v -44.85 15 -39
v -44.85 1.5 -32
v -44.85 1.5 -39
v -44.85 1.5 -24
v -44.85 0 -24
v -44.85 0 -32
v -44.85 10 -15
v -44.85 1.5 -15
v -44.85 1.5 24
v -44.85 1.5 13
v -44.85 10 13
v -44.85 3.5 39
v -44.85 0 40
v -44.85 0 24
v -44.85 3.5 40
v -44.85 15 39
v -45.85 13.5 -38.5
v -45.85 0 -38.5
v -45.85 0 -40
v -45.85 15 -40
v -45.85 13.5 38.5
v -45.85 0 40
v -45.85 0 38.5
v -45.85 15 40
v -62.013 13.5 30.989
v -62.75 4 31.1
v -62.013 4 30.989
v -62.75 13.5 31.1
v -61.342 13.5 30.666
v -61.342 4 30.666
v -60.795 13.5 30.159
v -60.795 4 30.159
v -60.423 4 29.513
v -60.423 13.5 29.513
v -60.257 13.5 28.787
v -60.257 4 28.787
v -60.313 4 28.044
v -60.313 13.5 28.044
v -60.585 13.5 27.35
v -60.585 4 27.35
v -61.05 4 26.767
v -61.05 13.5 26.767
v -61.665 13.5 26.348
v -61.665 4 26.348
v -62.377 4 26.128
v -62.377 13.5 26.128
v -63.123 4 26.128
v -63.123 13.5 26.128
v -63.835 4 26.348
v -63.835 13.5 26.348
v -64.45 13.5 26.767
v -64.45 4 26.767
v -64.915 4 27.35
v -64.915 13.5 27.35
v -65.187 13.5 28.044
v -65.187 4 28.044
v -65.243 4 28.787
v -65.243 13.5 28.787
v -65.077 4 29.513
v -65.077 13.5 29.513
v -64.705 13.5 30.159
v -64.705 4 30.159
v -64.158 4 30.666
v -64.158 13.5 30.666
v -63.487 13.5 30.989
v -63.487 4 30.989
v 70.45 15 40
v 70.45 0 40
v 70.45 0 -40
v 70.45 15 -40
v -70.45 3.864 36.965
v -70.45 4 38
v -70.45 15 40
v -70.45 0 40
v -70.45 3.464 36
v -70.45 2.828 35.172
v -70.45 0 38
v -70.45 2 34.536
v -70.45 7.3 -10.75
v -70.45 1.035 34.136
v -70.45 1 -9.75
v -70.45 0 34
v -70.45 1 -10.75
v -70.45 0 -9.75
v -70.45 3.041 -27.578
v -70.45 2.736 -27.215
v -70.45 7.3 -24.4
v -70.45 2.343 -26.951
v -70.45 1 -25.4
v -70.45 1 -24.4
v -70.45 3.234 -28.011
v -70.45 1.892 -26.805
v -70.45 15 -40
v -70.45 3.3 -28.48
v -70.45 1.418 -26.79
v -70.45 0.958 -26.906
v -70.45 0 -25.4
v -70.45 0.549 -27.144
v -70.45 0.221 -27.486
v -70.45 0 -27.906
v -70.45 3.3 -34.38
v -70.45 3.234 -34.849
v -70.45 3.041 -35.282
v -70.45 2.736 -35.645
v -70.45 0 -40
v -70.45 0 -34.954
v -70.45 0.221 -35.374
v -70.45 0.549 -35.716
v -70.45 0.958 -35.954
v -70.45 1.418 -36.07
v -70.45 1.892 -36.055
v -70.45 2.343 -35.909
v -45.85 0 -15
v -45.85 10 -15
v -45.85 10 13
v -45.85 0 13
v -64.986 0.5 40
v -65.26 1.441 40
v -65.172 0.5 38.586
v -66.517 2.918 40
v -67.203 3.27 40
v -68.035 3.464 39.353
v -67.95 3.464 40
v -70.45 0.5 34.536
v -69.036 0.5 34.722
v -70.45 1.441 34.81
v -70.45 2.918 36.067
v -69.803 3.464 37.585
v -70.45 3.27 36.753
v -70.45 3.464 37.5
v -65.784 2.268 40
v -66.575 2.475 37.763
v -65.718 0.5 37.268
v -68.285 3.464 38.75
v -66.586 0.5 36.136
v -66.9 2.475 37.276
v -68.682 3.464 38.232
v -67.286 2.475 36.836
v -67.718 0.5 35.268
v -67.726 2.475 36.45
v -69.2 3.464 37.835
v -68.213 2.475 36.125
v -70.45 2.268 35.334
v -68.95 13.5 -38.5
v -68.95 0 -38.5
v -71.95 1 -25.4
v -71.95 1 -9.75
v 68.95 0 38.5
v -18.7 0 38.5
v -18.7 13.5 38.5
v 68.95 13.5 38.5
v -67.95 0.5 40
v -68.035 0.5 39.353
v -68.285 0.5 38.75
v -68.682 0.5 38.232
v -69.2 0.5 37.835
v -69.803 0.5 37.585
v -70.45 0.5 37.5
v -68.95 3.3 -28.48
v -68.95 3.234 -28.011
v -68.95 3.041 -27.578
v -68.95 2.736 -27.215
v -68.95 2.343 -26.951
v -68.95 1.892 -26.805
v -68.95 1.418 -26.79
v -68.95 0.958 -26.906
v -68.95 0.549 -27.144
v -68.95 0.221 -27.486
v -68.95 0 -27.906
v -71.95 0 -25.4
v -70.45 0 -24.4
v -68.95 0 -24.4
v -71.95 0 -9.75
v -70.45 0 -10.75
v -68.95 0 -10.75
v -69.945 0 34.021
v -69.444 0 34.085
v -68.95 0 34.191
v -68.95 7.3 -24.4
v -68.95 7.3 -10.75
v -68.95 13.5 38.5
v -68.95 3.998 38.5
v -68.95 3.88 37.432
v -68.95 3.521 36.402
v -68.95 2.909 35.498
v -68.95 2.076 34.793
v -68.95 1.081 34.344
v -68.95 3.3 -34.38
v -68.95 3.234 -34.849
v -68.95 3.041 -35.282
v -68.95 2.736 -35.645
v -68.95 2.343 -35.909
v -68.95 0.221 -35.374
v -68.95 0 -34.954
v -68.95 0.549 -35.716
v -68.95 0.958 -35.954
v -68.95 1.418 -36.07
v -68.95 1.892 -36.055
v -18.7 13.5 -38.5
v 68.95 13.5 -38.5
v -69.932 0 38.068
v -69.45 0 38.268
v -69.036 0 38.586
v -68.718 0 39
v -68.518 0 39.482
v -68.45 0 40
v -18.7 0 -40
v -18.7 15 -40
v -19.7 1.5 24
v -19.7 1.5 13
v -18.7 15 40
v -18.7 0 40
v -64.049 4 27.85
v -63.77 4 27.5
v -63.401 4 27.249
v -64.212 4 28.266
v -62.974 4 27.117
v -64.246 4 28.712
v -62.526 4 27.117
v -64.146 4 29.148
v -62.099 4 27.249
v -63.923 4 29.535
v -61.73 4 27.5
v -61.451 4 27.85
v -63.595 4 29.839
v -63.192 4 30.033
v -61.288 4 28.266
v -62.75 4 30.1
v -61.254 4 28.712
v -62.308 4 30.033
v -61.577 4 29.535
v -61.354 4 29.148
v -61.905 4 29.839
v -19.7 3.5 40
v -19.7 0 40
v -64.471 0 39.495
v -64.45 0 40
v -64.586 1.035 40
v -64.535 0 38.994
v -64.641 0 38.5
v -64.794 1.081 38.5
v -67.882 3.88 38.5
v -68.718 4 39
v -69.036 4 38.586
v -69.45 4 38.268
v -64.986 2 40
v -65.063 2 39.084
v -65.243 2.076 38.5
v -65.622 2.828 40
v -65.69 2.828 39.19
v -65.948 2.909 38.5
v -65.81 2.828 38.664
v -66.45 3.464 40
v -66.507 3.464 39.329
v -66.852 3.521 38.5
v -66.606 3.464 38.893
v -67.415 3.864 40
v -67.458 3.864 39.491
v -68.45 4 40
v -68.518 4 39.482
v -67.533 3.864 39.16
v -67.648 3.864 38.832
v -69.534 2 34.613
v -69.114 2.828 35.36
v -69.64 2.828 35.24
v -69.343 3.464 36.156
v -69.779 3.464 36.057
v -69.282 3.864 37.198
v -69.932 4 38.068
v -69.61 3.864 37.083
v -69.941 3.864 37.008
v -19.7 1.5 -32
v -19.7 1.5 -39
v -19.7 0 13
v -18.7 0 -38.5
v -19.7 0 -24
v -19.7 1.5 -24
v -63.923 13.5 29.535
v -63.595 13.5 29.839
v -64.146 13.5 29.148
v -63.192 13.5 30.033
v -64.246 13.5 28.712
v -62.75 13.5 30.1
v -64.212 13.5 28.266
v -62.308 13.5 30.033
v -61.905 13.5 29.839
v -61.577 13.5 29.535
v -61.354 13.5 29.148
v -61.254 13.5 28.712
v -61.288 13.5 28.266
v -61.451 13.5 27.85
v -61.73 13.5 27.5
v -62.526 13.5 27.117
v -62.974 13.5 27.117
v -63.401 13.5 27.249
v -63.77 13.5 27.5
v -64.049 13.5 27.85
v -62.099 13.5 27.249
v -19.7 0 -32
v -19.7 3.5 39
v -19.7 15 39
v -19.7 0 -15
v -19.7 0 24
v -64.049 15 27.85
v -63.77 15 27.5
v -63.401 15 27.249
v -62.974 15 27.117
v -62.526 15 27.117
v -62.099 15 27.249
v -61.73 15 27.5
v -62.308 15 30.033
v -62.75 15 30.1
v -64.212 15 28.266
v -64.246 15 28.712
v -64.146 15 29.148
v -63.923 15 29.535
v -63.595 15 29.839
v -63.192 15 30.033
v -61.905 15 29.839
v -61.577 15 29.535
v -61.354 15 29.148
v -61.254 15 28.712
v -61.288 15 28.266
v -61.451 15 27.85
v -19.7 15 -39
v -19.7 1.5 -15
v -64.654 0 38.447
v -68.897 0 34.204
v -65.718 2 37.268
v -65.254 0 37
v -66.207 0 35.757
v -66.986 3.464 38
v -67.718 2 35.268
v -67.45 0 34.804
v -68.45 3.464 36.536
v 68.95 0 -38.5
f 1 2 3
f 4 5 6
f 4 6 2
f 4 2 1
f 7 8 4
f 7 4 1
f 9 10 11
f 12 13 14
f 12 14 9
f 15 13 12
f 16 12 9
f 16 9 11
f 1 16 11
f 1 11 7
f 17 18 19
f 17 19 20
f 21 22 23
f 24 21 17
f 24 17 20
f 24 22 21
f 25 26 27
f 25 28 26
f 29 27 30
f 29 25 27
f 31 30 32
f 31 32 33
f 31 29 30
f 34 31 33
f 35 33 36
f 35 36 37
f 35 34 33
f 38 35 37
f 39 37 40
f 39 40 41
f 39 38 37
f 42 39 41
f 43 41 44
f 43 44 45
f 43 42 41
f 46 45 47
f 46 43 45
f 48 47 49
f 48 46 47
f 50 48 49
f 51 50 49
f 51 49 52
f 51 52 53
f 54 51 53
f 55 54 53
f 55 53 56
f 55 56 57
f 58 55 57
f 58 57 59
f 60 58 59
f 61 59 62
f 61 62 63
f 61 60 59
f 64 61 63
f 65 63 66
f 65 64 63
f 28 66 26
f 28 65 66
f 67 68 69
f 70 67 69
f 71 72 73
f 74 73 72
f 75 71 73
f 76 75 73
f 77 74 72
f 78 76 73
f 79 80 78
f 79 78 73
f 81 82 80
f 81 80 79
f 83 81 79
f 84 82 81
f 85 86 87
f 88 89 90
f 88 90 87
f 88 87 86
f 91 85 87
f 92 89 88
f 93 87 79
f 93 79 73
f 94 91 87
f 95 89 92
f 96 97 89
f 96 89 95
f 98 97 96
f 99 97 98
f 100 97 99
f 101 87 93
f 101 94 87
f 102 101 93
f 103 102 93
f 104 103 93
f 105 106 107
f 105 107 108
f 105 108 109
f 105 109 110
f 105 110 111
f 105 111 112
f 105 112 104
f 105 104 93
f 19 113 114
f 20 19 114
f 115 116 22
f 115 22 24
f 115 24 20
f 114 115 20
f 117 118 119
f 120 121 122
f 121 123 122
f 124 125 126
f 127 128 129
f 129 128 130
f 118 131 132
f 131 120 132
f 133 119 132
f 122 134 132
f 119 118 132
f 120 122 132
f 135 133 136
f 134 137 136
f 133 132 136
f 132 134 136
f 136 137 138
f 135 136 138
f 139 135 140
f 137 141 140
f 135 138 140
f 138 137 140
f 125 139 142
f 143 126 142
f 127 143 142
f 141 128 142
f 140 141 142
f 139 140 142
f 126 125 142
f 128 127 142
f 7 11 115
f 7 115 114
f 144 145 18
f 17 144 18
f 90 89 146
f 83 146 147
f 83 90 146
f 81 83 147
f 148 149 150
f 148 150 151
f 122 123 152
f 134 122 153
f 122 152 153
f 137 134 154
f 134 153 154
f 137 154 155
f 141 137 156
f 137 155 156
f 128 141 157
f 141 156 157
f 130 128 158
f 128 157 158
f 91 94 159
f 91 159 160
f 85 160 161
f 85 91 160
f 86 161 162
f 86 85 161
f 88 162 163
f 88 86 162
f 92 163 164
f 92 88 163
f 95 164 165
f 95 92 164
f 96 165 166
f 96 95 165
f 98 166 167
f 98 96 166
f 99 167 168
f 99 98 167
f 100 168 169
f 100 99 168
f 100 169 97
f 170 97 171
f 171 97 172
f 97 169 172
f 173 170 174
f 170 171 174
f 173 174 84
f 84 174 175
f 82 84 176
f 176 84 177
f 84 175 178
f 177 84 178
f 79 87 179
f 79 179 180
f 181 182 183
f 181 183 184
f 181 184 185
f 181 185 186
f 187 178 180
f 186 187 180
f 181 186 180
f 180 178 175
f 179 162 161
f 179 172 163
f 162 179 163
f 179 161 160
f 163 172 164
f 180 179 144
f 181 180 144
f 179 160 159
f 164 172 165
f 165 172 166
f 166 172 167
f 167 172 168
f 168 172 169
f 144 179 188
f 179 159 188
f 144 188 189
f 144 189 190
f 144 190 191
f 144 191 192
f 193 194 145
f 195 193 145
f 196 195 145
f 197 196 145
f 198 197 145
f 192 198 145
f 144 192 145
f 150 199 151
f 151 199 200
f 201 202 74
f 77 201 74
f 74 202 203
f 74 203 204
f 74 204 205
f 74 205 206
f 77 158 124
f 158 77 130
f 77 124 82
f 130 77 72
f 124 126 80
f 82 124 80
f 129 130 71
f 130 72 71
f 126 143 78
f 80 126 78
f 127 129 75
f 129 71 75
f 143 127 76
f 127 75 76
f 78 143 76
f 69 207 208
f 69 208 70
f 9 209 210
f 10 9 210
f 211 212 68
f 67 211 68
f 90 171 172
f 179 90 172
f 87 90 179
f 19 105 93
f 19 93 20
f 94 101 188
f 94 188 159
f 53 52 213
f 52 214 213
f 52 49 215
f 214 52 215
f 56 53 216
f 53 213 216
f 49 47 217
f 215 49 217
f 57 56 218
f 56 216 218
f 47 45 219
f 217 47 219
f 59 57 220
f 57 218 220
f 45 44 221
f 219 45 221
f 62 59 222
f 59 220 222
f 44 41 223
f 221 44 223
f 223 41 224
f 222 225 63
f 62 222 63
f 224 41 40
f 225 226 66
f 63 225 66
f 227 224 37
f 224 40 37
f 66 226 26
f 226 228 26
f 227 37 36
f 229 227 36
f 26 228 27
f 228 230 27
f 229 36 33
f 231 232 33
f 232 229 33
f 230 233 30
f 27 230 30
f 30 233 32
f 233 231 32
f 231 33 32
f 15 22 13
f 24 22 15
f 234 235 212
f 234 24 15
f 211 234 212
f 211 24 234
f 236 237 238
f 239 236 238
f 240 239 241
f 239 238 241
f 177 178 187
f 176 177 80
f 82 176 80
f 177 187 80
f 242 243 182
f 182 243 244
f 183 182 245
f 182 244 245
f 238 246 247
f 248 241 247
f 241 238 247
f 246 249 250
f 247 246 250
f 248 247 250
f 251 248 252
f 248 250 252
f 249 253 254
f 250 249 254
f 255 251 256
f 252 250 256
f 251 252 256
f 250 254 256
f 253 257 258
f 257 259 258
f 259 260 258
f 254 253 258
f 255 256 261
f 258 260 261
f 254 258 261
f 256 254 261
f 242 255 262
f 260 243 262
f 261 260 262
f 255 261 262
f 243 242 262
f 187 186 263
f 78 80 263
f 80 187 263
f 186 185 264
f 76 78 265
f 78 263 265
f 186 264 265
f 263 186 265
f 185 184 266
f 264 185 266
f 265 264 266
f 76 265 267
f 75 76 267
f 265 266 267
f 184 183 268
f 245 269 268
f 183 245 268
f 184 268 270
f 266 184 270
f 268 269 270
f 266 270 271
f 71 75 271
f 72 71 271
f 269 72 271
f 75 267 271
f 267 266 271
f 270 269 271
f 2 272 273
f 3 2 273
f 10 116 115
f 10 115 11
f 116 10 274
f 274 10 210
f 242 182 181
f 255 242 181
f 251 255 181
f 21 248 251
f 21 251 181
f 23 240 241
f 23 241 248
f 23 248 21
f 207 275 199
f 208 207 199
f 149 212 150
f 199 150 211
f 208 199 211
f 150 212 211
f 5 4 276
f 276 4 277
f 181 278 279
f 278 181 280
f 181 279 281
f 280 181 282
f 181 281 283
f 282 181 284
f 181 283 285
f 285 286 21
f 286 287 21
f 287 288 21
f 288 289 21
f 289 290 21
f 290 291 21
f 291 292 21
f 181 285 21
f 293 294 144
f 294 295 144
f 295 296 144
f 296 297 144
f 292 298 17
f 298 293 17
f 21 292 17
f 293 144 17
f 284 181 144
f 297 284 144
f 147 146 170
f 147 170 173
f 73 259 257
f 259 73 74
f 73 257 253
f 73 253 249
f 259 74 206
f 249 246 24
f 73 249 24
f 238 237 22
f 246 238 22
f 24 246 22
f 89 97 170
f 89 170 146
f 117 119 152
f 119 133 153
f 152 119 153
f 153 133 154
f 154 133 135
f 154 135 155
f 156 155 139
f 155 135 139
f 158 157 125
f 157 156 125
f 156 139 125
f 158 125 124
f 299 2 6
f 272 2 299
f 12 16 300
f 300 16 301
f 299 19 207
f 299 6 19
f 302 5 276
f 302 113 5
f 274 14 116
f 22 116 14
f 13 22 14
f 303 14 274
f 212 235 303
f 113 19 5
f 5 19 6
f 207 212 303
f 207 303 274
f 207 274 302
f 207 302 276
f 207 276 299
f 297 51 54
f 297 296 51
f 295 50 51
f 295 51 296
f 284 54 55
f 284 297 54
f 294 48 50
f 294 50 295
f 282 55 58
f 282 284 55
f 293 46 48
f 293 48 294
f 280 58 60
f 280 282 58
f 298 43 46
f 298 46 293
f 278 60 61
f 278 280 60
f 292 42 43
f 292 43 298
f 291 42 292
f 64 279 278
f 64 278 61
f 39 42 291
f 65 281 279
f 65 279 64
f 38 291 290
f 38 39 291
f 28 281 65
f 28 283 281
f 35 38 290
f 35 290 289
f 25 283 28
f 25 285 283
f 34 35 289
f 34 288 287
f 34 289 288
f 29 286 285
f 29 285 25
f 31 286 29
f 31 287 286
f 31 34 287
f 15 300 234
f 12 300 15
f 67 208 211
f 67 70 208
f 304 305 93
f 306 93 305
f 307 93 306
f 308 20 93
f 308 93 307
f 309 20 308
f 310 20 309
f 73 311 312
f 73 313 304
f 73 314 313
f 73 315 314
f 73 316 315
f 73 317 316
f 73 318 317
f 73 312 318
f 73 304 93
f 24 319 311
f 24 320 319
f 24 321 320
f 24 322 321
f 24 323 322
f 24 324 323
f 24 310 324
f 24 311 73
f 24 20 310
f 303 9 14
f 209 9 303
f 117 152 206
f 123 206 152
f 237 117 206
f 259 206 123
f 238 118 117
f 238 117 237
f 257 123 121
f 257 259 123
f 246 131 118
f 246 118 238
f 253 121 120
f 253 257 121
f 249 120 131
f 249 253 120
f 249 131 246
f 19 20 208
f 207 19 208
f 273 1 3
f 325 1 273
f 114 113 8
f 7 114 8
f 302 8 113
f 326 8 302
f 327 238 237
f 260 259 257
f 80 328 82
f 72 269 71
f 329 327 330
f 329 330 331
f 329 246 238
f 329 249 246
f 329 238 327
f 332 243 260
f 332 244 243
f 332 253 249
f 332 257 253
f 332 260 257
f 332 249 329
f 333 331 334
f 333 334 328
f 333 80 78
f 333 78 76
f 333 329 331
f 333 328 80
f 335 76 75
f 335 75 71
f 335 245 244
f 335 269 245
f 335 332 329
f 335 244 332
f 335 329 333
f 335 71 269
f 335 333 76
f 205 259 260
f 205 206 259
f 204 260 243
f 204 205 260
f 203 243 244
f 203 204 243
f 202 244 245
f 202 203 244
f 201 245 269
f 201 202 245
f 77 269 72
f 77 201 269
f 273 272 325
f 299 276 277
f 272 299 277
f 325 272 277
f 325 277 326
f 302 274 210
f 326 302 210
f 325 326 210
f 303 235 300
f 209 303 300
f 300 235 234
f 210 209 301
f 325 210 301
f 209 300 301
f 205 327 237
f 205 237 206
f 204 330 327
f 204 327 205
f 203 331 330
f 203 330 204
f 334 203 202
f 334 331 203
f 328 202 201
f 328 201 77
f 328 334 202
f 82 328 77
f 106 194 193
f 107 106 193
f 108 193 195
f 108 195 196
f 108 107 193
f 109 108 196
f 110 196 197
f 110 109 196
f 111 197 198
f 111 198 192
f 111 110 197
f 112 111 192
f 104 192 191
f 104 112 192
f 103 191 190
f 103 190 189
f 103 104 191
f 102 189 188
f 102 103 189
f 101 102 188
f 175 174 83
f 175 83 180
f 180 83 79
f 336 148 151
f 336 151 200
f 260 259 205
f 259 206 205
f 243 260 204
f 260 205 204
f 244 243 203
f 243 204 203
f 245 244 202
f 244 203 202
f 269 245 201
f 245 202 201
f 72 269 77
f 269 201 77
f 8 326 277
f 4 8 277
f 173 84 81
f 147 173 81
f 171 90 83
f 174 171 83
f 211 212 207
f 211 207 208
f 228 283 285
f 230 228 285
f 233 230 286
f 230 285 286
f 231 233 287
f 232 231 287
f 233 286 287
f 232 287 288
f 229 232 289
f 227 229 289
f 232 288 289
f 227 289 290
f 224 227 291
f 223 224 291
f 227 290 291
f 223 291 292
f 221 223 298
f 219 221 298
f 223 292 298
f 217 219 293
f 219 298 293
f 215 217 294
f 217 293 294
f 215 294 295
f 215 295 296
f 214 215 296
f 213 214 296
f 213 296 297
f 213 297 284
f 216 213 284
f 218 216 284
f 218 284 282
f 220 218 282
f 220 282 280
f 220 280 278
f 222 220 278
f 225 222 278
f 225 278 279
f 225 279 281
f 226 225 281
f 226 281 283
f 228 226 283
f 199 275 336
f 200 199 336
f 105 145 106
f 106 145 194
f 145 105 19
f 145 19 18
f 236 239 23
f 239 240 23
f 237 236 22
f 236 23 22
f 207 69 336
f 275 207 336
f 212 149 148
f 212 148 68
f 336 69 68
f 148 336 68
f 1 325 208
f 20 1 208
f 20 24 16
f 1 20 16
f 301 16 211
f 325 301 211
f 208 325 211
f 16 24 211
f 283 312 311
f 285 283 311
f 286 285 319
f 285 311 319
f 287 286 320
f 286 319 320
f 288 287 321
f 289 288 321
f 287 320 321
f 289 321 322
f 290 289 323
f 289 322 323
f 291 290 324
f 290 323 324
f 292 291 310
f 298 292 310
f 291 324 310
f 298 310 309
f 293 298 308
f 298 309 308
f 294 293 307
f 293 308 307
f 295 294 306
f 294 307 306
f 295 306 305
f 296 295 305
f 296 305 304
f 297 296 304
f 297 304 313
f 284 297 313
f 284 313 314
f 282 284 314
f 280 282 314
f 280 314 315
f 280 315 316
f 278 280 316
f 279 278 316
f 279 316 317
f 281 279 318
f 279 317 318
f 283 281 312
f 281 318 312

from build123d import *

# Parameters (mm, degrees)
SKETCH1_W                  = 140.9
SKETCH1_H                  = 80
BOSS_EXTRUDE1_DEPTH        = 15
SHELL3_T                   = -1.5
CUT_EXTRUDE2_DEPTH         = 1.5
SKETCH6_W                  = 13.65
SKETCH6_H                  = 7.3
CUT_EXTRUDE3_DEPTH         = 1.5
SKETCH9_W                  = 15.65
SKETCH9_H                  = 1
BOSS_EXTRUDE2_DEPTH        = 1.5
SKETCH11_R                 = 1.5
BOSS_EXTRUDE10_DEPTH       = 11
SKETCH11_3_R               = 1.5
CUT_EXTRUDE10_DEPTH        = 1.5
SHELL9_T                   = 1
CUT_REVOLVE4_ANGLE         = 90
REVOLVE3_ANGLE             = 90
SHELL14_T                  = -0.5
SKETCH47_W                 = 27.15
SKETCH47_H                 = 15
CUT_EXTRUDE15_DEPTH        = 109.636101274
SKETCH47_2_W               = 27.15
SKETCH47_2_H               = 15
BOSS_EXTRUDE12_DEPTH       = 80
SHELL15_T                  = -1
SHELL15_THICKNESS_2_FACE_W = 78
SHELL15_THICKNESS_2_FACE_H = 25.15
SHELL15_THICKNESS_2_DEPTH  = 0.5
SKETCH52_W                 = 25.15
SKETCH52_H                 = 3.5
CUT_EXTRUDE21_DEPTH        = 1
SKETCH54_W                 = 28
SKETCH54_H                 = 10
CUT_EXTRUDE22_DEPTH        = 1
SKETCH55_W                 = 25.15
SKETCH55_H                 = 15
SKETCH55_H_2               = 28
SKETCH55_H_3               = 8
CUT_EXTRUDE23_DEPTH        = 1.5


with BuildPart() as part:
    # Sketch1 → Boss-Extrude1 (new body)
    with BuildSketch(Plane(origin=(0, 0, 0), x_dir=(1, 0, 0), z_dir=(0, 1, 0))):
        Rectangle(SKETCH1_W, SKETCH1_H)
    extrude(amount=BOSS_EXTRUDE1_DEPTH)

    # Shell3
    shell3_openings = [part.faces().sort_by_distance(p)[0] for p in [
        (0, 0, 0),
    ]]
    offset(amount=SHELL3_T, openings=shell3_openings, kind=Kind.INTERSECTION)

    # Sketch4 → Cut-Extrude2 (cut)
    with BuildSketch(Plane.ZY.offset(70.45)):
        with BuildLine():
            Line((-34.38, 3.3), (-28.48, 3.3))
            ThreePointArc((-28.48, 3.3), (-26.78, 1.6), (-28.48, -0.1))
            Line((-28.48, -0.1), (-34.38, -0.1))
            ThreePointArc((-34.38, -0.1), (-36.08, 1.6), (-34.38, 3.3))
        make_face()
    extrude(amount=-CUT_EXTRUDE2_DEPTH, mode=Mode.SUBTRACT)

    # Sketch6 → Cut-Extrude3 (cut)
    with BuildSketch(Plane.ZY.offset(70.45)):
        with Locations((-17.575, 3.65)):
            Rectangle(SKETCH6_W, SKETCH6_H)
    extrude(amount=-CUT_EXTRUDE3_DEPTH, mode=Mode.SUBTRACT)

    # Sketch9 → Boss-Extrude2 (add)
    with BuildSketch(Plane.ZY.offset(70.45)):
        with Locations((-17.575, 0.5)):
            Rectangle(SKETCH9_W, SKETCH9_H)
    extrude(amount=BOSS_EXTRUDE2_DEPTH)

    # Sketch11 → Boss-Extrude10 (add)
    with BuildSketch(Plane(origin=(0, 15, 0), x_dir=(1, 0, 0), z_dir=(0, 1, 0))):
        with Locations(Location((-62.75, -28.6, 0), (0, 0, 270))):
            Circle(SKETCH11_R)
    extrude(amount=-BOSS_EXTRUDE10_DEPTH)

    # Sketch11<3> → Cut-Extrude10 (cut)
    with BuildSketch(Plane(origin=(0, 15, 0), x_dir=(1, 0, 0), z_dir=(0, 1, 0))):
        with Locations(Location((-62.75, -28.6, 0), (0, 0, 270))):
            Circle(SKETCH11_3_R)
    extrude(amount=-CUT_EXTRUDE10_DEPTH, mode=Mode.SUBTRACT)


with BuildPart() as cut_extrude10_piece_1:
    # of the separate pieces the step leaves, piece 1, a body of its own (cut_extrude10_pieces)
    add(part.part.solids().sort_by_distance((-70.45, 0, 40))[0])

    # Sketch33 → Cut-Revolve4 (revolve, cut)
    with BuildSketch(Plane.XY.offset(40)):
        with BuildLine():
            Line((-68.45, 4), (-68.45, 0))
            Line((-68.45, 0), (-64.45, 0))
            ThreePointArc((-64.45, 0), (-65.621572875, 2.828427125), (-68.45, 4))
        make_face()
    revolve(axis=Axis((-70.45, 15, 40), (0, 1, 0)), revolution_arc=CUT_REVOLVE4_ANGLE, mode=Mode.SUBTRACT)

    # Sketch47 → Cut-Extrude15 (cut, through all)
    with BuildSketch(Plane.XY.offset(40)):
        with Locations((-32.275, 7.5)):
            Rectangle(SKETCH47_W, SKETCH47_H)
    extrude(amount=-CUT_EXTRUDE15_DEPTH, mode=Mode.SUBTRACT)


with BuildPart() as cut_extrude10_piece_2:
    # of the separate pieces the step leaves, piece 2, a body of its own (cut_extrude10_pieces)
    add(part.part.solids().sort_by_distance((-62.75, 4, 30.1))[0])

    # Shell9
    shell9_openings = [cut_extrude10_piece_2.faces().sort_by_distance(p)[0] for p in [
        (-62.75, 4, 28.6),
        (-62.75, 13.5, 28.6),
    ]]
    offset(amount=SHELL9_T, openings=shell9_openings, kind=Kind.INTERSECTION)


with BuildPart() as body_3:
    # Sketch33<2> → Revolve3 (revolve)
    with BuildSketch(Plane.XY.offset(40)):
        with BuildLine():
            Line((-68.45, 4), (-68.45, 0))
            Line((-68.45, 0), (-64.45, 0))
            ThreePointArc((-64.45, 0), (-65.621572875, 2.828427125), (-68.45, 4))
        make_face()
    revolve(axis=Axis((-70.45, 15, 40), (0, 1, 0)), revolution_arc=REVOLVE3_ANGLE)

    # Shell14
    shell14_openings = [body_3.faces().sort_by_distance(p)[0] for p in [
        (-70.45, 1.697652726, 36.302347274),
        (-66.752347274, 1.697652726, 40),
    ]]
    offset(amount=SHELL14_T, openings=shell14_openings)


with BuildPart() as cut_extrude15_piece_1:
    # of the separate pieces the step leaves, piece 1, a body of its own (cut_extrude15_pieces)
    add(cut_extrude10_piece_1.part.solids().sort_by_distance((-18.7, 0, 40))[0])


with BuildPart() as cut_extrude15_piece_2:
    # of the separate pieces the step leaves, piece 2, a body of its own (cut_extrude15_pieces)
    add(cut_extrude10_piece_1.part.solids().sort_by_distance((-70.45, 0, 40))[0])


with BuildPart() as body_5:
    # Sketch47<2> → Boss-Extrude12 (new body)
    with BuildSketch(Plane.XY.offset(40)):
        with Locations((-32.275, 7.5)):
            Rectangle(SKETCH47_2_W, SKETCH47_2_H)
    extrude(amount=-BOSS_EXTRUDE12_DEPTH)

    # Shell15
    shell15_openings = [body_5.faces().sort_by_distance(p)[0] for p in [
        (-32.275, 15, 0),
    ]]
    offset(amount=SHELL15_T, openings=shell15_openings, kind=Kind.INTERSECTION)

    # Shell15 thickness 2 face (on inner face of the shell) → Shell15 thickness 2 (add)
    with BuildSketch(Plane(origin=(-32.275, 1, 0), x_dir=(0, 0, -1), z_dir=(0, -1, 0))):
        Rectangle(SHELL15_THICKNESS_2_FACE_W, SHELL15_THICKNESS_2_FACE_H)
    extrude(amount=-SHELL15_THICKNESS_2_DEPTH)

    # Sketch52 → Cut-Extrude21 (cut)
    with BuildSketch(Plane(origin=(0, 0, 39), x_dir=(-1, 0, 0), z_dir=(0, 0, -1))):
        with Locations((32.275, 1.75)):
            Rectangle(SKETCH52_W, SKETCH52_H)
    extrude(amount=-CUT_EXTRUDE21_DEPTH, mode=Mode.SUBTRACT)

    # Sketch54 → Cut-Extrude22 (cut)
    with BuildSketch(Plane(origin=(-44.85, 0, 0), x_dir=(0, 0, -1), z_dir=(1, 0, 0))):
        with Locations((1, 5)):
            Rectangle(SKETCH54_W, SKETCH54_H)
    extrude(amount=-CUT_EXTRUDE22_DEPTH, mode=Mode.SUBTRACT)

    # Sketch55 → Cut-Extrude23 (cut)
    with BuildSketch(Plane(origin=(0, 1.5, 0), x_dir=(1, 0, 0), z_dir=(0, 1, 0))):
        with Locations((-32.275, -31.5)):
            Rectangle(SKETCH55_W, SKETCH55_H)
        with Locations((-32.275, 1)):
            Rectangle(SKETCH55_W, SKETCH55_H_2)
        with Locations((-32.275, 28)):
            Rectangle(SKETCH55_W, SKETCH55_H_3)
    extrude(amount=-CUT_EXTRUDE23_DEPTH, mode=Mode.SUBTRACT)


solid = Compound([cut_extrude10_piece_2.part, body_3.part, cut_extrude15_piece_1.part, cut_extrude15_piece_2.part, body_5.part])
